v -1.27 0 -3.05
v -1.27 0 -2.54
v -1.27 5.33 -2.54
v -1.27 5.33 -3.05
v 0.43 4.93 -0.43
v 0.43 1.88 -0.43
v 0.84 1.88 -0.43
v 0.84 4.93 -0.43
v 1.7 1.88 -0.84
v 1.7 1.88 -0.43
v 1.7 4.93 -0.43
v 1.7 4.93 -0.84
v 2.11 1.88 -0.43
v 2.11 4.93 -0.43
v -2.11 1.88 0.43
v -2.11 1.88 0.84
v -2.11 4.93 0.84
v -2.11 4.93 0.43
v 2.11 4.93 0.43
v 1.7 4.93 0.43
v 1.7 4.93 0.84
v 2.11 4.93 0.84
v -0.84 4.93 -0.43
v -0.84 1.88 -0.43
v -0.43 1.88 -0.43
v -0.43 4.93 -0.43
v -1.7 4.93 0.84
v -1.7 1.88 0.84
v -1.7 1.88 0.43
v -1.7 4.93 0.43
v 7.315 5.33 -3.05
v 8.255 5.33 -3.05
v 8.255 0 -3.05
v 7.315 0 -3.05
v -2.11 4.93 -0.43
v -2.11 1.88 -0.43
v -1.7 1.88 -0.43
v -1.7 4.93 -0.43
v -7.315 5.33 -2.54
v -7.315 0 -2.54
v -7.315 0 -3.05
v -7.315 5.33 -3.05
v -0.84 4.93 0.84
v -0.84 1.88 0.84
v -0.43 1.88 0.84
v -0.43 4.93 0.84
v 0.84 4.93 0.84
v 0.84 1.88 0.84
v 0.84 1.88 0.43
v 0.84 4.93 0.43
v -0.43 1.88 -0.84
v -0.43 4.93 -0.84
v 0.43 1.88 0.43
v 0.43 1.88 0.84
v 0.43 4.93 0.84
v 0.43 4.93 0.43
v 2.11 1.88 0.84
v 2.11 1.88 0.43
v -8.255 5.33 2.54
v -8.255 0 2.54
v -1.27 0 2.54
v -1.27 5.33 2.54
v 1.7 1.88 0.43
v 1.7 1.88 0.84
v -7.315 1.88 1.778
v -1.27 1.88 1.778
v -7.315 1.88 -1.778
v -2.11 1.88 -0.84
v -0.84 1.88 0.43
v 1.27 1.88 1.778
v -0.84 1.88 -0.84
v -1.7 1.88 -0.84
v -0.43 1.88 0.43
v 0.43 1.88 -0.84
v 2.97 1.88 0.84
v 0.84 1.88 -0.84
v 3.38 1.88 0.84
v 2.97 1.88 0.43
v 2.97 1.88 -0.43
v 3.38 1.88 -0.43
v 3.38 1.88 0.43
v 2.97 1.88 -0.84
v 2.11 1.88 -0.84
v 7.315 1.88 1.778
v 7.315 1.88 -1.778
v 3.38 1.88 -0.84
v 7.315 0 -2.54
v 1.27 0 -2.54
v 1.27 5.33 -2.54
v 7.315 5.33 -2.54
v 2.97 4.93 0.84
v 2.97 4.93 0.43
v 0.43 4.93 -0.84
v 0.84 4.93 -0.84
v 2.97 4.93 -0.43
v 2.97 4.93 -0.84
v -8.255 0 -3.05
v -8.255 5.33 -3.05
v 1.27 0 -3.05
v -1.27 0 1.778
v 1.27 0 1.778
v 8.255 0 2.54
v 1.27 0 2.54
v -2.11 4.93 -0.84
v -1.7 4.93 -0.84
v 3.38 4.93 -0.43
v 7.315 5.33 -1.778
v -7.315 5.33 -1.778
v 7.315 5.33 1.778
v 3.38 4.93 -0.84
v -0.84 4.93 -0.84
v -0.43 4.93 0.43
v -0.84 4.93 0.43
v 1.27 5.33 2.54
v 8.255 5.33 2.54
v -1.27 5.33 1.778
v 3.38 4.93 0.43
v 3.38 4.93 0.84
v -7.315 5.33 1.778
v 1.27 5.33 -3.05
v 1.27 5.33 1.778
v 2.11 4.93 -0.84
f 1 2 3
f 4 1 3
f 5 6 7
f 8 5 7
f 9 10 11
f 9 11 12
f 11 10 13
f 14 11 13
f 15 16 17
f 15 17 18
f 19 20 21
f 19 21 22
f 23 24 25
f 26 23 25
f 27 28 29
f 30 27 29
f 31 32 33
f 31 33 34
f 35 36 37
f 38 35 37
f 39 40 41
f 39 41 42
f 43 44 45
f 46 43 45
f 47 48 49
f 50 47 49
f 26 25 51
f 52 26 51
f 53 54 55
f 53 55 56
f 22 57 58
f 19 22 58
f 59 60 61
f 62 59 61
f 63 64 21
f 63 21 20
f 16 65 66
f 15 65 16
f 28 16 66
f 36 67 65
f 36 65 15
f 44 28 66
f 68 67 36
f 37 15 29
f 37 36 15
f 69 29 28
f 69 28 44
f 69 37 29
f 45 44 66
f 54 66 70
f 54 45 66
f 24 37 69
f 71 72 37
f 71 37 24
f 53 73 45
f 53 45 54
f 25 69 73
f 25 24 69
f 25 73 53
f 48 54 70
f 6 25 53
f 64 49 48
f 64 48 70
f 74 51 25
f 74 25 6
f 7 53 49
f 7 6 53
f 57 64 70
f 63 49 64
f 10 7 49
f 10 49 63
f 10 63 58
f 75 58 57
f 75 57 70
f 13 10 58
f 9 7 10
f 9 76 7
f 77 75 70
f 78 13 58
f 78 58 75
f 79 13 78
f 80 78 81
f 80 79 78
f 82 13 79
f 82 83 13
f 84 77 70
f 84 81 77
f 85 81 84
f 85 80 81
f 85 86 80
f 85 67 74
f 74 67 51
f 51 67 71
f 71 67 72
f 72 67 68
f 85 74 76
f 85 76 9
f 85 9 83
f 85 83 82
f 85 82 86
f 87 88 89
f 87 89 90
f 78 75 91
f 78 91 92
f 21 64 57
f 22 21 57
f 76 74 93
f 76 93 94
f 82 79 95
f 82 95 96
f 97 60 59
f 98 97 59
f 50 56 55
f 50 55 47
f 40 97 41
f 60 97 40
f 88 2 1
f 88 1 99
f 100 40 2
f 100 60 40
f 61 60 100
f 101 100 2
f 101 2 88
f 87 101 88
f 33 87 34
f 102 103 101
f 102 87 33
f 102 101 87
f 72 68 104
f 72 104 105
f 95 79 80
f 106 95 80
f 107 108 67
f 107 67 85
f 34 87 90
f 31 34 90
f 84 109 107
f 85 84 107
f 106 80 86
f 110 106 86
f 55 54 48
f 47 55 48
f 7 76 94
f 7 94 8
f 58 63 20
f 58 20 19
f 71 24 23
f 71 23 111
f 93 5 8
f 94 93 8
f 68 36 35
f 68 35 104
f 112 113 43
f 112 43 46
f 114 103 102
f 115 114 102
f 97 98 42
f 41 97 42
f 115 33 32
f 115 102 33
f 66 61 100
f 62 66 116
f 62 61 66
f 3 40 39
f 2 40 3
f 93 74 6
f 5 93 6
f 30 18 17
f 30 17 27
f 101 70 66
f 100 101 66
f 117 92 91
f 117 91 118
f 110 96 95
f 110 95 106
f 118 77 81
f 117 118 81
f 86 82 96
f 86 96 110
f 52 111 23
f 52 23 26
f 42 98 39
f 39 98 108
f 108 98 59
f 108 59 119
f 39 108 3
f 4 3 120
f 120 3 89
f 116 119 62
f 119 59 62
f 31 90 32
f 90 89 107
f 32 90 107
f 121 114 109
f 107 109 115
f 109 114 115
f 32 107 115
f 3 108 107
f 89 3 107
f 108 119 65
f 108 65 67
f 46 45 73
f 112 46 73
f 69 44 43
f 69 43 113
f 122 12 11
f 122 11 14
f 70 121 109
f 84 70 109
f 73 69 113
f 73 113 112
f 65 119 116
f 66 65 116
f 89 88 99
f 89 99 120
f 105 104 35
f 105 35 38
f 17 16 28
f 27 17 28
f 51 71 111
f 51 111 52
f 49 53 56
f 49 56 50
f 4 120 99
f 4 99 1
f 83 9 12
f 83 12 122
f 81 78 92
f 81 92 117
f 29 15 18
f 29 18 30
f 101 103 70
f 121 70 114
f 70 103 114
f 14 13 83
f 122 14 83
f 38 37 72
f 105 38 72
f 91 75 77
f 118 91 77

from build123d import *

# Parameters (mm, degrees)
SKETCH1_W               = 16.51
SKETCH1_H               = 5.08
BOSS_EXTRUDE1_DEPTH     = 5.33
SKETCH2_W               = 14.63
SKETCH2_H               = 3.556
CUT_EXTRUDE1_DEPTH      = 3.45
SKETCH4_W               = 0.94
SKETCH4_H               = 5.33
SKETCH4_W_2             = 1.27
BOSS_EXTRUDE2_DEPTH     = 0.51
SKETCH5_W               = 1.27
SKETCH5_H               = 5.33
CUT_EXTRUDE2_DEPTH      = 0.762
SKETCH6_W               = 0.41
SKETCH6_H               = 0.41
BOSS_EXTRUDE3_DEPTH     = 3.05
LPATTERN1_COUNT         = 3
LPATTERN1_PITCH         = 1.27
LPATTERN1_COL_COUNT     = 3
LPATTERN1_COL_PITCH     = 1.27
MIRROR2_COPY_1_SKETCH_W = 0.41
MIRROR2_COPY_1_SKETCH_H = 0.41
MIRROR2_COPY_1_DEPTH    = 3.05
MIRROR2_COPY_2_SKETCH_W = 0.41
MIRROR2_COPY_2_SKETCH_H = 0.41
MIRROR2_COPY_2_DEPTH    = 3.05
MIRROR2_COPY_3_SKETCH_W = 0.41
MIRROR2_COPY_3_SKETCH_H = 0.41
MIRROR2_COPY_3_DEPTH    = 3.05
MIRROR2_COPY_4_SKETCH_W = 0.41
MIRROR2_COPY_4_SKETCH_H = 0.41
MIRROR2_COPY_4_DEPTH    = 3.05


with BuildPart() as part:
    # Sketch1 → Boss-Extrude1 (new body)
    with BuildSketch(Plane(origin=(0, 0, 0), x_dir=(1, 0, 0), z_dir=(0, 1, 0))):
        Rectangle(SKETCH1_W, SKETCH1_H)
    extrude(amount=BOSS_EXTRUDE1_DEPTH)

    # Sketch2 → Cut-Extrude1 (cut)
    with BuildSketch(Plane(origin=(0, 5.33, 0), x_dir=(1, 0, 0), z_dir=(0, 1, 0))):
        Rectangle(SKETCH2_W, SKETCH2_H)
    cut_extrude1 = extrude(amount=-CUT_EXTRUDE1_DEPTH, mode=Mode.SUBTRACT)

    # Sketch4 → Boss-Extrude2 (add)
    with BuildSketch(Plane(origin=(0, 0, -2.54), x_dir=(-1, 0, 0), z_dir=(0, 0, -1))):
        with Locations((-7.785, 2.665)):
            Rectangle(SKETCH4_W, SKETCH4_H)
        with Locations((-0.635, 2.665)):
            Rectangle(SKETCH4_W_2, SKETCH4_H)
    boss_extrude2 = extrude(amount=BOSS_EXTRUDE2_DEPTH)

    # Sketch5 → Cut-Extrude2 (cut)
    with BuildSketch(Plane.XY.offset(2.54)):
        with Locations((0.635, 2.665)):
            Rectangle(SKETCH5_W, SKETCH5_H)
    cut_extrude2 = extrude(amount=-CUT_EXTRUDE2_DEPTH, mode=Mode.SUBTRACT)

    # Mirror1: Cut-Extrude1, Boss-Extrude2, Cut-Extrude2 across plane
    add(cut_extrude1.mirror(Plane(origin=(0, 0, 0), x_dir=(0, 0, 1), z_dir=(1, 0, 0))), mode=Mode.SUBTRACT)
    add(boss_extrude2.mirror(Plane(origin=(0, 0, 0), x_dir=(0, 0, 1), z_dir=(1, 0, 0))))
    add(cut_extrude2.mirror(Plane(origin=(0, 0, 0), x_dir=(0, 0, 1), z_dir=(1, 0, 0))), mode=Mode.SUBTRACT)

    # Sketch6 → Boss-Extrude3 (add)
    with BuildSketch(Plane(origin=(0, 1.88, 0), x_dir=(1, 0, 0), z_dir=(0, 1, 0))):
        with Locations((0.635, -0.635)):
            Rectangle(SKETCH6_W, SKETCH6_H)
    boss_extrude3 = extrude(amount=BOSS_EXTRUDE3_DEPTH)

    # LPattern1: Boss-Extrude3 ×3
    with Locations(*[(i * LPATTERN1_PITCH, 0, 0) for i in range(1, LPATTERN1_COUNT)]):
        add(boss_extrude3)

    # LPattern1 col: Boss-Extrude3 ×3
    with Locations(*[(-i * LPATTERN1_COL_PITCH, 0, 0) for i in range(1, LPATTERN1_COL_COUNT)]):
        add(boss_extrude3)

    # Mirror2: Boss-Extrude3 across plane
    add(boss_extrude3.mirror(Plane.XY))

    # Mirror2 copy 1 sketch → Mirror2 copy 1 (add)
    with BuildSketch(Plane(origin=(1.27, 1.88, 0), x_dir=(1, 0, 0), z_dir=(0, 1, 0))):
        with Locations((0.635, 0.635)):
            Rectangle(MIRROR2_COPY_1_SKETCH_W, MIRROR2_COPY_1_SKETCH_H)
    extrude(amount=MIRROR2_COPY_1_DEPTH)

    # Mirror2 copy 2 sketch → Mirror2 copy 2 (add)
    with BuildSketch(Plane(origin=(2.54, 1.88, 0), x_dir=(1, 0, 0), z_dir=(0, 1, 0))):
        with Locations((0.635, 0.635)):
            Rectangle(MIRROR2_COPY_2_SKETCH_W, MIRROR2_COPY_2_SKETCH_H)
    extrude(amount=MIRROR2_COPY_2_DEPTH)

    # Mirror2 copy 3 sketch → Mirror2 copy 3 (add)
    with BuildSketch(Plane(origin=(-1.27, 1.88, 0), x_dir=(1, 0, 0), z_dir=(0, 1, 0))):
        with Locations((0.635, 0.635)):
            Rectangle(MIRROR2_COPY_3_SKETCH_W, MIRROR2_COPY_3_SKETCH_H)
    extrude(amount=MIRROR2_COPY_3_DEPTH)

    # Mirror2 copy 4 sketch → Mirror2 copy 4 (add)
    with BuildSketch(Plane(origin=(-2.54, 1.88, 0), x_dir=(1, 0, 0), z_dir=(0, 1, 0))):
        with Locations((0.635, 0.635)):
            Rectangle(MIRROR2_COPY_4_SKETCH_W, MIRROR2_COPY_4_SKETCH_H)
    extrude(amount=MIRROR2_COPY_4_DEPTH)


solid = part.part
